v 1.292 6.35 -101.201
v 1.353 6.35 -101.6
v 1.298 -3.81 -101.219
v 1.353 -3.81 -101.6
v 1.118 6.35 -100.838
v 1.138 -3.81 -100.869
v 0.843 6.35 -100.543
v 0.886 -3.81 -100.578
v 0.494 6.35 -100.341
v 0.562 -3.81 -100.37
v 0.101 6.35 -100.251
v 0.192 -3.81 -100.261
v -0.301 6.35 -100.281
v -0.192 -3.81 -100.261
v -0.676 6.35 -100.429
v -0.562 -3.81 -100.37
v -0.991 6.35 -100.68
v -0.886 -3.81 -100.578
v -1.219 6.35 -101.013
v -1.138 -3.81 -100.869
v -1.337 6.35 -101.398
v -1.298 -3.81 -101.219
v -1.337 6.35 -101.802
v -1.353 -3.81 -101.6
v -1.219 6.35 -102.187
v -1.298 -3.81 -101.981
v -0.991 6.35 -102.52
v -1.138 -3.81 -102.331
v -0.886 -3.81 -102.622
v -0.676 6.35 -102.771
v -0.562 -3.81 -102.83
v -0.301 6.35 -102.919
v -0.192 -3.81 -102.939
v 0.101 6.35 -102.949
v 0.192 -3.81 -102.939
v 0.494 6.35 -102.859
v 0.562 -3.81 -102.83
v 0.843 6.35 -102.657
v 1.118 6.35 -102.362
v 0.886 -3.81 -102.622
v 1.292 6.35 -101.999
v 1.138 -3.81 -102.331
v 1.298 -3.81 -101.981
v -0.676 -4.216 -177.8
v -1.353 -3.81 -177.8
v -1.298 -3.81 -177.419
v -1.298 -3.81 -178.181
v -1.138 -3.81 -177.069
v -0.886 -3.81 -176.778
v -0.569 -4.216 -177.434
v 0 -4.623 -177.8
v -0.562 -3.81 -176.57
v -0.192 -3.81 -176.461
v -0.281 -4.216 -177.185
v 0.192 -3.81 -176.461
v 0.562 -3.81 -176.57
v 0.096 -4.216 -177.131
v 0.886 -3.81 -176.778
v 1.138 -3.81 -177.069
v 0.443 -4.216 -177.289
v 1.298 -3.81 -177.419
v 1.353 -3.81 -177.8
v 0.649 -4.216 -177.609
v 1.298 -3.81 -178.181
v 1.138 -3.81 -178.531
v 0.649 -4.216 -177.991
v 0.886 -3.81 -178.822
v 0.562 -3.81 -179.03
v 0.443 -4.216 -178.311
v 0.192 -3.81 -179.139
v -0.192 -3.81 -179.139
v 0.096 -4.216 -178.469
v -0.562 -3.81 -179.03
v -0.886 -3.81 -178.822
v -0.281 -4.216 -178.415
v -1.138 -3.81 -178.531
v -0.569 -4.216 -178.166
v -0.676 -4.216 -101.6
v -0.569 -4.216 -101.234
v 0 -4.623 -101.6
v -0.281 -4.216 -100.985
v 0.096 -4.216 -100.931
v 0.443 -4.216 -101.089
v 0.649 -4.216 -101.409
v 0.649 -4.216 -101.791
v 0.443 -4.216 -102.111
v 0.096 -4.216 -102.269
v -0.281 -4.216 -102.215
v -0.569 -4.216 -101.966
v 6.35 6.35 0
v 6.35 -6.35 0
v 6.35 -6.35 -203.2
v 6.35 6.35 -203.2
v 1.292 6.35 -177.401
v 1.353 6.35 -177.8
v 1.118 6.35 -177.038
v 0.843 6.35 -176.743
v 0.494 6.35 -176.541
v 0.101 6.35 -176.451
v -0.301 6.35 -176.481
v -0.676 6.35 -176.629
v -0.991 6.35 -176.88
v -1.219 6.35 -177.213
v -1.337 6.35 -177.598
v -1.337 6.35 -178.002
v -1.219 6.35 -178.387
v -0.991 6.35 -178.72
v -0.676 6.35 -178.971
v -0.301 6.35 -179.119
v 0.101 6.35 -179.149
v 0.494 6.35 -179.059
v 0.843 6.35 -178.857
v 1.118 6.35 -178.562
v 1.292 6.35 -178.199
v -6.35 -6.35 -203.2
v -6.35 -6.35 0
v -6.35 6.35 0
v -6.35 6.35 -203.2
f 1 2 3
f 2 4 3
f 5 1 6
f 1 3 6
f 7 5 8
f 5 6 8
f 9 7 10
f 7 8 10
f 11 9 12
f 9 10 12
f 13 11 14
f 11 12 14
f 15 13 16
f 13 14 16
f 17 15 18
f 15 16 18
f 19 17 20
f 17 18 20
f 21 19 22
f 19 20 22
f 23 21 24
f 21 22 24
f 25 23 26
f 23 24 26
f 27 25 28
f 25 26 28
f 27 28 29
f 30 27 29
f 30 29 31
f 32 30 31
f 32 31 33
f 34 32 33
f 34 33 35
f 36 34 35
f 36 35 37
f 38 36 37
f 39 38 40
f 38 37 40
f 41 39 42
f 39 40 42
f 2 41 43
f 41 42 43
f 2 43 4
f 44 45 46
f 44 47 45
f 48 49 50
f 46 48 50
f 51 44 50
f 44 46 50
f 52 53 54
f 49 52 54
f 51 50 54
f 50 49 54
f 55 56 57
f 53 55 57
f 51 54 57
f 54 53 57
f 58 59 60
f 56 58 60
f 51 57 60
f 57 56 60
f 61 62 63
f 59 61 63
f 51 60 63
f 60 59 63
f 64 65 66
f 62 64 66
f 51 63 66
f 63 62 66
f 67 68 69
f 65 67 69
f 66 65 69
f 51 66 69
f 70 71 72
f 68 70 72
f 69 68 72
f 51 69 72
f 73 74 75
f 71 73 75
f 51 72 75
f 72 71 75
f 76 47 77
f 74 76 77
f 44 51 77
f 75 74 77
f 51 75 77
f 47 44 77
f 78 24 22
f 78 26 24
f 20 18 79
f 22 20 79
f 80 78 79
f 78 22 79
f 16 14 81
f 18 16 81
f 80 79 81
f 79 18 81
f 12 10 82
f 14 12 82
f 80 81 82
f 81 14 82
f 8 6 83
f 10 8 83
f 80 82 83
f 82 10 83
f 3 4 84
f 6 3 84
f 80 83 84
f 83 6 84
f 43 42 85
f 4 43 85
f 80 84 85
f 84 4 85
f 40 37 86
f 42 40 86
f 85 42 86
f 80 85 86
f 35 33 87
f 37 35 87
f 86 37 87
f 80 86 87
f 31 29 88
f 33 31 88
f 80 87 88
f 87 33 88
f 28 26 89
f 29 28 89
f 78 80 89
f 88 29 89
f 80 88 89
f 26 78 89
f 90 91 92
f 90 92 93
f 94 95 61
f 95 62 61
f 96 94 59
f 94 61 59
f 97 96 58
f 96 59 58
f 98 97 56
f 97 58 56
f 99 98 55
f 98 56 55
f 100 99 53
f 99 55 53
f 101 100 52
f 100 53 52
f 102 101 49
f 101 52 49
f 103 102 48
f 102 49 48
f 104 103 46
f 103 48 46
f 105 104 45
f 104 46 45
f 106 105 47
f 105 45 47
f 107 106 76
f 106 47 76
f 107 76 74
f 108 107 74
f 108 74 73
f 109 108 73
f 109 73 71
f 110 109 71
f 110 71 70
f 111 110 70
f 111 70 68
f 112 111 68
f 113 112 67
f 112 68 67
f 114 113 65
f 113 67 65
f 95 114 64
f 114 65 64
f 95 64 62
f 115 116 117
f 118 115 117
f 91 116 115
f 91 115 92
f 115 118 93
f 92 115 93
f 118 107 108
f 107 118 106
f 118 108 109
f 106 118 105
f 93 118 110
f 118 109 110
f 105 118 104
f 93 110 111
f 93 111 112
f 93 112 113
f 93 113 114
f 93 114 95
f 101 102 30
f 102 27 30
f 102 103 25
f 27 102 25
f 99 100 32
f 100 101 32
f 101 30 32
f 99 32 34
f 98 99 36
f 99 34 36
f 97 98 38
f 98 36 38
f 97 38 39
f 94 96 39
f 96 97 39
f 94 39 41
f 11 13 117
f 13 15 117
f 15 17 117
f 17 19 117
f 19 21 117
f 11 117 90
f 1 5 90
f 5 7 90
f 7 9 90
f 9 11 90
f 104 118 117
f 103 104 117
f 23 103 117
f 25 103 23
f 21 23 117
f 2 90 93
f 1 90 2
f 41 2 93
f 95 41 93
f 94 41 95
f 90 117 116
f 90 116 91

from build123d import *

# Parameters (mm, degrees)
F0_W     = 12.7
F0_H     = 12.7
F1_DEPTH = 203.2
F3_D     = 2.7051
F3_DEPTH = 10.16
F3_TIP   = 0.8126940303


with BuildPart() as f1:
    # F0 (on Top) → F1 (new body)
    with BuildSketch(Plane.XY):
        Rectangle(F0_W, F0_H)
    extrude(amount=-F1_DEPTH)

    # F3
    with Locations(Plane(origin=(0, 6.35, 0), x_dir=(-1, 0, 0), z_dir=(0, 1, 0))):
        with Locations((0, -101.6), (0, -177.8)):
            Hole(F3_D / 2, depth=F3_DEPTH)
            with Locations((0, 0, -(F3_DEPTH + F3_TIP / 2))):  # 118° drill point
                Cone(0, F3_D / 2, F3_TIP, mode=Mode.SUBTRACT)


solid = f1.part
